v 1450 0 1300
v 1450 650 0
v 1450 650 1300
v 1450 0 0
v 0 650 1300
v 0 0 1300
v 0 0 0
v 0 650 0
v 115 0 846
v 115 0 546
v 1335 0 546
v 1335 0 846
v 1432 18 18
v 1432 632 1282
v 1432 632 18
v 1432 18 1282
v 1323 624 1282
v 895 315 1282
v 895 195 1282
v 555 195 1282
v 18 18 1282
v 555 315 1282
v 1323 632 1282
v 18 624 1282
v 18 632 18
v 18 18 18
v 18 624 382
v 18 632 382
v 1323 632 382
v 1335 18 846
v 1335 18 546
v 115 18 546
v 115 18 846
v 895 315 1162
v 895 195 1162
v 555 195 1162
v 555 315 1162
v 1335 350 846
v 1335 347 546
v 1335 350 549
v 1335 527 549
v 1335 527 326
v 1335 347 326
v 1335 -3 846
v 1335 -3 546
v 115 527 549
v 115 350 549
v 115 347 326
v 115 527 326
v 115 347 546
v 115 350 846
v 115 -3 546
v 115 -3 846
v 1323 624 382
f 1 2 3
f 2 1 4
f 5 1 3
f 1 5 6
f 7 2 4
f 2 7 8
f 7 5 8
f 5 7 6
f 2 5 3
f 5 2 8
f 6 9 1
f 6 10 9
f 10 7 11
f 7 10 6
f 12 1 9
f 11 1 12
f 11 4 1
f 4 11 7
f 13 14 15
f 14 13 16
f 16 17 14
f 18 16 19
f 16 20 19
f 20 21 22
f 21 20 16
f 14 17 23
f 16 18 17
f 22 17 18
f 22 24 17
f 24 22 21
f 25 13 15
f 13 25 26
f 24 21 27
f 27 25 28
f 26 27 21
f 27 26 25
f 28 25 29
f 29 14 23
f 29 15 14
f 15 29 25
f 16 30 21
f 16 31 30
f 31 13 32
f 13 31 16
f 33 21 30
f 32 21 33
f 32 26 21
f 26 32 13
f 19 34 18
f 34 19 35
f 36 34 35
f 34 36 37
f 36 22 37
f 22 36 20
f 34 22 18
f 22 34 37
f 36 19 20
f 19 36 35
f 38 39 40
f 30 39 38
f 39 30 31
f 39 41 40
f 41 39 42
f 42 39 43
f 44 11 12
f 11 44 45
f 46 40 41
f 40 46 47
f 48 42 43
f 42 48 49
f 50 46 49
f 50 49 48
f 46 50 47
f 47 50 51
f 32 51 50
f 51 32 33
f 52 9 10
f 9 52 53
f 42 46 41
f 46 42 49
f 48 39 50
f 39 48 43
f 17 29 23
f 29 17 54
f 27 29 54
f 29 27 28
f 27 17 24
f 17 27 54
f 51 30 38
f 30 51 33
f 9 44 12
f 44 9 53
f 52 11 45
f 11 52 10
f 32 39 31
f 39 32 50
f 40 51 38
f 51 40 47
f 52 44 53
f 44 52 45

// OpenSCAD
// Pianola (player piano) — parametric STRUCTURAL-ENVELOPE scaffold (concept-only).
//
// Authority: pending_measurement. NOT fabrication authority.
// ---------------------------------------------------------------------------
// HONESTY BOUNDARY (read before using any value here):
//   This packet is deliberately NON-DIMENSIONAL. README.md, design.md,
//   bom.csv, cut-list.csv, and docs/parametric-design-table.md release NO
//   absolute dimensions — every symbol (trackerPortPitch, pouchOutputMargin,
//   actuatorTravelMargin, ...) is `pending_measurement`. Therefore EVERY
//   numeric leaf value below is a RENDER-ONLY PLACEHOLDER chosen only so the
//   envelope draws; NONE is a design, timing, pressure, or fabrication
//   authority. Placeholders are tagged `// PLACEHOLDER`.
//   The DOCUMENTED content this file honestly encodes is the set of SYMBOLIC
//   RELATIONSHIPS from docs/parametric-design-table.md (leak budget, pouch/
//   valve/actuator margins) — expressed as formulas, not baked values.
//   This models the ACOUSTIC/STRUCTURAL ENVELOPE (piano case, string band,
//   keyboard, pneumatic-stack reserved volumes). Full mechanism (roll drive,
//   pouch/valve internals, action linkage) is intentionally OUT OF SCOPE —
//   see design.md.
// ---------------------------------------------------------------------------
// Units: millimeters.

/* [Piano case envelope — upright player piano, PLACEHOLDER extents] */
case_width_mm      = 1450;  // PLACEHOLDER keyboard-span width
case_height_mm     = 1300;  // PLACEHOLDER upright case height
case_depth_mm      = 650;   // PLACEHOLDER case depth
wall_thk_mm        = 18;    // PLACEHOLDER case wall thickness
soundboard_thk_mm  = 8;     // PLACEHOLDER soundboard thickness

/* [Keyboard / action envelope — PLACEHOLDER] */
key_count          = 88;    // PLACEHOLDER compass (no scale authority)
key_span_mm        = 1220;  // PLACEHOLDER 88-key span envelope
keyboard_depth_mm  = 350;   // PLACEHOLDER keyboard well depth
action_height_mm   = 300;   // PLACEHOLDER action envelope height

/* [String band envelope — PLACEHOLDER] */
string_band_frac   = 0.9;   // PLACEHOLDER string band as fraction of width
string_band_ht_mm  = 900;   // PLACEHOLDER vertical string-band height (upright)

/* [Pneumatic stack envelope — docs/parametric-design-table.md; PLACEHOLDER] */
tracker_bar_len_mm = 300;   // PLACEHOLDER tracker-bar length
roll_span_mm       = 340;   // PLACEHOLDER roll transport span
valve_chest_ht_mm  = 220;   // PLACEHOLDER pouch/valve chest height
pouch_motion_mm    = 6;     // PLACEHOLDER pouchMotionAvailable
valve_motion_mm    = 4;     // PLACEHOLDER valveMotionRequired
actuator_travel_mm = 12;    // PLACEHOLDER actuatorTravelAvailable
action_travel_mm   = 10;    // PLACEHOLDER actionTravelRequired

// ---------------------------------------------------------------------------
// Derived geometry — DOCUMENTED symbolic margins as formulas
// (docs/parametric-design-table.md). Honest, source-traceable part of model.
// ---------------------------------------------------------------------------

// pouchOutputMargin = pouchMotionAvailable - valveMotionRequired (must be > 0).
function pouch_output_margin(pouch, valve) = pouch - valve;
pouch_margin_mm = pouch_output_margin(pouch_motion_mm, valve_motion_mm);

// actuatorTravelMargin = actuatorTravelAvailable - actionTravelRequired (> 0).
function actuator_travel_margin(act, action) = act - action;
actuator_margin_mm = actuator_travel_margin(actuator_travel_mm, action_travel_mm);

margins_ok = (pouch_margin_mm > 0) && (actuator_margin_mm > 0);
string_band_len_mm = case_width_mm * string_band_frac;

module case_shell() {
  difference() {
    cube([case_width_mm, case_depth_mm, case_height_mm]);
    translate([wall_thk_mm, wall_thk_mm, wall_thk_mm])
      cube([case_width_mm - 2*wall_thk_mm, case_depth_mm - 2*wall_thk_mm,
            case_height_mm - 2*wall_thk_mm]);
  }
}

eps = 3;  // interpenetration so interior features form a clean 2-manifold union

module soundboard_and_strings() {
  // Vertical soundboard + string band at the back of the upright case.
  // Embed into the back wall (eps overlap) to avoid coincident faces.
  translate([wall_thk_mm, case_depth_mm - wall_thk_mm - soundboard_thk_mm, case_height_mm - string_band_ht_mm - wall_thk_mm])
    cube([string_band_len_mm, soundboard_thk_mm + wall_thk_mm/2, string_band_ht_mm]);
}

module keyboard_and_action() {
  // Keyboard well + action envelope at the front, mid-height (crosses front wall).
  translate([(case_width_mm - key_span_mm)/2, -eps, case_height_mm*0.42])
    cube([key_span_mm, keyboard_depth_mm + eps, action_height_mm]);
}

module pneumatic_stack() {
  // Tracker bar + roll transport (top) and valve chest (below action) as
  // reserved envelope volumes only; embedded with eps overlaps.
  translate([(case_width_mm - roll_span_mm)/2, case_depth_mm*0.3, case_height_mm - wall_thk_mm - 120])
    cube([roll_span_mm, 120, 120 + wall_thk_mm/2]);              // roll + tracker bar (into top wall)
  translate([(case_width_mm - key_span_mm)/2, keyboard_depth_mm - eps, case_height_mm*0.42 - valve_chest_ht_mm])
    cube([key_span_mm, 180, valve_chest_ht_mm + eps]);           // pouch/valve chest (overlaps keyboard)
}

module pianola_assembly() {
  case_shell();
  soundboard_and_strings();
  keyboard_and_action();
  pneumatic_stack();
}

pianola_assembly();

echo(str("pouch_output_margin_mm=", pouch_margin_mm));
echo(str("actuator_travel_margin_mm=", actuator_margin_mm));
echo(str("string_band_len_mm=", string_band_len_mm));
echo(str("margins_ok(placeholder)=", margins_ok));
echo("AUTHORITY=pending_measurement; all leaf values are render-only placeholders.");
